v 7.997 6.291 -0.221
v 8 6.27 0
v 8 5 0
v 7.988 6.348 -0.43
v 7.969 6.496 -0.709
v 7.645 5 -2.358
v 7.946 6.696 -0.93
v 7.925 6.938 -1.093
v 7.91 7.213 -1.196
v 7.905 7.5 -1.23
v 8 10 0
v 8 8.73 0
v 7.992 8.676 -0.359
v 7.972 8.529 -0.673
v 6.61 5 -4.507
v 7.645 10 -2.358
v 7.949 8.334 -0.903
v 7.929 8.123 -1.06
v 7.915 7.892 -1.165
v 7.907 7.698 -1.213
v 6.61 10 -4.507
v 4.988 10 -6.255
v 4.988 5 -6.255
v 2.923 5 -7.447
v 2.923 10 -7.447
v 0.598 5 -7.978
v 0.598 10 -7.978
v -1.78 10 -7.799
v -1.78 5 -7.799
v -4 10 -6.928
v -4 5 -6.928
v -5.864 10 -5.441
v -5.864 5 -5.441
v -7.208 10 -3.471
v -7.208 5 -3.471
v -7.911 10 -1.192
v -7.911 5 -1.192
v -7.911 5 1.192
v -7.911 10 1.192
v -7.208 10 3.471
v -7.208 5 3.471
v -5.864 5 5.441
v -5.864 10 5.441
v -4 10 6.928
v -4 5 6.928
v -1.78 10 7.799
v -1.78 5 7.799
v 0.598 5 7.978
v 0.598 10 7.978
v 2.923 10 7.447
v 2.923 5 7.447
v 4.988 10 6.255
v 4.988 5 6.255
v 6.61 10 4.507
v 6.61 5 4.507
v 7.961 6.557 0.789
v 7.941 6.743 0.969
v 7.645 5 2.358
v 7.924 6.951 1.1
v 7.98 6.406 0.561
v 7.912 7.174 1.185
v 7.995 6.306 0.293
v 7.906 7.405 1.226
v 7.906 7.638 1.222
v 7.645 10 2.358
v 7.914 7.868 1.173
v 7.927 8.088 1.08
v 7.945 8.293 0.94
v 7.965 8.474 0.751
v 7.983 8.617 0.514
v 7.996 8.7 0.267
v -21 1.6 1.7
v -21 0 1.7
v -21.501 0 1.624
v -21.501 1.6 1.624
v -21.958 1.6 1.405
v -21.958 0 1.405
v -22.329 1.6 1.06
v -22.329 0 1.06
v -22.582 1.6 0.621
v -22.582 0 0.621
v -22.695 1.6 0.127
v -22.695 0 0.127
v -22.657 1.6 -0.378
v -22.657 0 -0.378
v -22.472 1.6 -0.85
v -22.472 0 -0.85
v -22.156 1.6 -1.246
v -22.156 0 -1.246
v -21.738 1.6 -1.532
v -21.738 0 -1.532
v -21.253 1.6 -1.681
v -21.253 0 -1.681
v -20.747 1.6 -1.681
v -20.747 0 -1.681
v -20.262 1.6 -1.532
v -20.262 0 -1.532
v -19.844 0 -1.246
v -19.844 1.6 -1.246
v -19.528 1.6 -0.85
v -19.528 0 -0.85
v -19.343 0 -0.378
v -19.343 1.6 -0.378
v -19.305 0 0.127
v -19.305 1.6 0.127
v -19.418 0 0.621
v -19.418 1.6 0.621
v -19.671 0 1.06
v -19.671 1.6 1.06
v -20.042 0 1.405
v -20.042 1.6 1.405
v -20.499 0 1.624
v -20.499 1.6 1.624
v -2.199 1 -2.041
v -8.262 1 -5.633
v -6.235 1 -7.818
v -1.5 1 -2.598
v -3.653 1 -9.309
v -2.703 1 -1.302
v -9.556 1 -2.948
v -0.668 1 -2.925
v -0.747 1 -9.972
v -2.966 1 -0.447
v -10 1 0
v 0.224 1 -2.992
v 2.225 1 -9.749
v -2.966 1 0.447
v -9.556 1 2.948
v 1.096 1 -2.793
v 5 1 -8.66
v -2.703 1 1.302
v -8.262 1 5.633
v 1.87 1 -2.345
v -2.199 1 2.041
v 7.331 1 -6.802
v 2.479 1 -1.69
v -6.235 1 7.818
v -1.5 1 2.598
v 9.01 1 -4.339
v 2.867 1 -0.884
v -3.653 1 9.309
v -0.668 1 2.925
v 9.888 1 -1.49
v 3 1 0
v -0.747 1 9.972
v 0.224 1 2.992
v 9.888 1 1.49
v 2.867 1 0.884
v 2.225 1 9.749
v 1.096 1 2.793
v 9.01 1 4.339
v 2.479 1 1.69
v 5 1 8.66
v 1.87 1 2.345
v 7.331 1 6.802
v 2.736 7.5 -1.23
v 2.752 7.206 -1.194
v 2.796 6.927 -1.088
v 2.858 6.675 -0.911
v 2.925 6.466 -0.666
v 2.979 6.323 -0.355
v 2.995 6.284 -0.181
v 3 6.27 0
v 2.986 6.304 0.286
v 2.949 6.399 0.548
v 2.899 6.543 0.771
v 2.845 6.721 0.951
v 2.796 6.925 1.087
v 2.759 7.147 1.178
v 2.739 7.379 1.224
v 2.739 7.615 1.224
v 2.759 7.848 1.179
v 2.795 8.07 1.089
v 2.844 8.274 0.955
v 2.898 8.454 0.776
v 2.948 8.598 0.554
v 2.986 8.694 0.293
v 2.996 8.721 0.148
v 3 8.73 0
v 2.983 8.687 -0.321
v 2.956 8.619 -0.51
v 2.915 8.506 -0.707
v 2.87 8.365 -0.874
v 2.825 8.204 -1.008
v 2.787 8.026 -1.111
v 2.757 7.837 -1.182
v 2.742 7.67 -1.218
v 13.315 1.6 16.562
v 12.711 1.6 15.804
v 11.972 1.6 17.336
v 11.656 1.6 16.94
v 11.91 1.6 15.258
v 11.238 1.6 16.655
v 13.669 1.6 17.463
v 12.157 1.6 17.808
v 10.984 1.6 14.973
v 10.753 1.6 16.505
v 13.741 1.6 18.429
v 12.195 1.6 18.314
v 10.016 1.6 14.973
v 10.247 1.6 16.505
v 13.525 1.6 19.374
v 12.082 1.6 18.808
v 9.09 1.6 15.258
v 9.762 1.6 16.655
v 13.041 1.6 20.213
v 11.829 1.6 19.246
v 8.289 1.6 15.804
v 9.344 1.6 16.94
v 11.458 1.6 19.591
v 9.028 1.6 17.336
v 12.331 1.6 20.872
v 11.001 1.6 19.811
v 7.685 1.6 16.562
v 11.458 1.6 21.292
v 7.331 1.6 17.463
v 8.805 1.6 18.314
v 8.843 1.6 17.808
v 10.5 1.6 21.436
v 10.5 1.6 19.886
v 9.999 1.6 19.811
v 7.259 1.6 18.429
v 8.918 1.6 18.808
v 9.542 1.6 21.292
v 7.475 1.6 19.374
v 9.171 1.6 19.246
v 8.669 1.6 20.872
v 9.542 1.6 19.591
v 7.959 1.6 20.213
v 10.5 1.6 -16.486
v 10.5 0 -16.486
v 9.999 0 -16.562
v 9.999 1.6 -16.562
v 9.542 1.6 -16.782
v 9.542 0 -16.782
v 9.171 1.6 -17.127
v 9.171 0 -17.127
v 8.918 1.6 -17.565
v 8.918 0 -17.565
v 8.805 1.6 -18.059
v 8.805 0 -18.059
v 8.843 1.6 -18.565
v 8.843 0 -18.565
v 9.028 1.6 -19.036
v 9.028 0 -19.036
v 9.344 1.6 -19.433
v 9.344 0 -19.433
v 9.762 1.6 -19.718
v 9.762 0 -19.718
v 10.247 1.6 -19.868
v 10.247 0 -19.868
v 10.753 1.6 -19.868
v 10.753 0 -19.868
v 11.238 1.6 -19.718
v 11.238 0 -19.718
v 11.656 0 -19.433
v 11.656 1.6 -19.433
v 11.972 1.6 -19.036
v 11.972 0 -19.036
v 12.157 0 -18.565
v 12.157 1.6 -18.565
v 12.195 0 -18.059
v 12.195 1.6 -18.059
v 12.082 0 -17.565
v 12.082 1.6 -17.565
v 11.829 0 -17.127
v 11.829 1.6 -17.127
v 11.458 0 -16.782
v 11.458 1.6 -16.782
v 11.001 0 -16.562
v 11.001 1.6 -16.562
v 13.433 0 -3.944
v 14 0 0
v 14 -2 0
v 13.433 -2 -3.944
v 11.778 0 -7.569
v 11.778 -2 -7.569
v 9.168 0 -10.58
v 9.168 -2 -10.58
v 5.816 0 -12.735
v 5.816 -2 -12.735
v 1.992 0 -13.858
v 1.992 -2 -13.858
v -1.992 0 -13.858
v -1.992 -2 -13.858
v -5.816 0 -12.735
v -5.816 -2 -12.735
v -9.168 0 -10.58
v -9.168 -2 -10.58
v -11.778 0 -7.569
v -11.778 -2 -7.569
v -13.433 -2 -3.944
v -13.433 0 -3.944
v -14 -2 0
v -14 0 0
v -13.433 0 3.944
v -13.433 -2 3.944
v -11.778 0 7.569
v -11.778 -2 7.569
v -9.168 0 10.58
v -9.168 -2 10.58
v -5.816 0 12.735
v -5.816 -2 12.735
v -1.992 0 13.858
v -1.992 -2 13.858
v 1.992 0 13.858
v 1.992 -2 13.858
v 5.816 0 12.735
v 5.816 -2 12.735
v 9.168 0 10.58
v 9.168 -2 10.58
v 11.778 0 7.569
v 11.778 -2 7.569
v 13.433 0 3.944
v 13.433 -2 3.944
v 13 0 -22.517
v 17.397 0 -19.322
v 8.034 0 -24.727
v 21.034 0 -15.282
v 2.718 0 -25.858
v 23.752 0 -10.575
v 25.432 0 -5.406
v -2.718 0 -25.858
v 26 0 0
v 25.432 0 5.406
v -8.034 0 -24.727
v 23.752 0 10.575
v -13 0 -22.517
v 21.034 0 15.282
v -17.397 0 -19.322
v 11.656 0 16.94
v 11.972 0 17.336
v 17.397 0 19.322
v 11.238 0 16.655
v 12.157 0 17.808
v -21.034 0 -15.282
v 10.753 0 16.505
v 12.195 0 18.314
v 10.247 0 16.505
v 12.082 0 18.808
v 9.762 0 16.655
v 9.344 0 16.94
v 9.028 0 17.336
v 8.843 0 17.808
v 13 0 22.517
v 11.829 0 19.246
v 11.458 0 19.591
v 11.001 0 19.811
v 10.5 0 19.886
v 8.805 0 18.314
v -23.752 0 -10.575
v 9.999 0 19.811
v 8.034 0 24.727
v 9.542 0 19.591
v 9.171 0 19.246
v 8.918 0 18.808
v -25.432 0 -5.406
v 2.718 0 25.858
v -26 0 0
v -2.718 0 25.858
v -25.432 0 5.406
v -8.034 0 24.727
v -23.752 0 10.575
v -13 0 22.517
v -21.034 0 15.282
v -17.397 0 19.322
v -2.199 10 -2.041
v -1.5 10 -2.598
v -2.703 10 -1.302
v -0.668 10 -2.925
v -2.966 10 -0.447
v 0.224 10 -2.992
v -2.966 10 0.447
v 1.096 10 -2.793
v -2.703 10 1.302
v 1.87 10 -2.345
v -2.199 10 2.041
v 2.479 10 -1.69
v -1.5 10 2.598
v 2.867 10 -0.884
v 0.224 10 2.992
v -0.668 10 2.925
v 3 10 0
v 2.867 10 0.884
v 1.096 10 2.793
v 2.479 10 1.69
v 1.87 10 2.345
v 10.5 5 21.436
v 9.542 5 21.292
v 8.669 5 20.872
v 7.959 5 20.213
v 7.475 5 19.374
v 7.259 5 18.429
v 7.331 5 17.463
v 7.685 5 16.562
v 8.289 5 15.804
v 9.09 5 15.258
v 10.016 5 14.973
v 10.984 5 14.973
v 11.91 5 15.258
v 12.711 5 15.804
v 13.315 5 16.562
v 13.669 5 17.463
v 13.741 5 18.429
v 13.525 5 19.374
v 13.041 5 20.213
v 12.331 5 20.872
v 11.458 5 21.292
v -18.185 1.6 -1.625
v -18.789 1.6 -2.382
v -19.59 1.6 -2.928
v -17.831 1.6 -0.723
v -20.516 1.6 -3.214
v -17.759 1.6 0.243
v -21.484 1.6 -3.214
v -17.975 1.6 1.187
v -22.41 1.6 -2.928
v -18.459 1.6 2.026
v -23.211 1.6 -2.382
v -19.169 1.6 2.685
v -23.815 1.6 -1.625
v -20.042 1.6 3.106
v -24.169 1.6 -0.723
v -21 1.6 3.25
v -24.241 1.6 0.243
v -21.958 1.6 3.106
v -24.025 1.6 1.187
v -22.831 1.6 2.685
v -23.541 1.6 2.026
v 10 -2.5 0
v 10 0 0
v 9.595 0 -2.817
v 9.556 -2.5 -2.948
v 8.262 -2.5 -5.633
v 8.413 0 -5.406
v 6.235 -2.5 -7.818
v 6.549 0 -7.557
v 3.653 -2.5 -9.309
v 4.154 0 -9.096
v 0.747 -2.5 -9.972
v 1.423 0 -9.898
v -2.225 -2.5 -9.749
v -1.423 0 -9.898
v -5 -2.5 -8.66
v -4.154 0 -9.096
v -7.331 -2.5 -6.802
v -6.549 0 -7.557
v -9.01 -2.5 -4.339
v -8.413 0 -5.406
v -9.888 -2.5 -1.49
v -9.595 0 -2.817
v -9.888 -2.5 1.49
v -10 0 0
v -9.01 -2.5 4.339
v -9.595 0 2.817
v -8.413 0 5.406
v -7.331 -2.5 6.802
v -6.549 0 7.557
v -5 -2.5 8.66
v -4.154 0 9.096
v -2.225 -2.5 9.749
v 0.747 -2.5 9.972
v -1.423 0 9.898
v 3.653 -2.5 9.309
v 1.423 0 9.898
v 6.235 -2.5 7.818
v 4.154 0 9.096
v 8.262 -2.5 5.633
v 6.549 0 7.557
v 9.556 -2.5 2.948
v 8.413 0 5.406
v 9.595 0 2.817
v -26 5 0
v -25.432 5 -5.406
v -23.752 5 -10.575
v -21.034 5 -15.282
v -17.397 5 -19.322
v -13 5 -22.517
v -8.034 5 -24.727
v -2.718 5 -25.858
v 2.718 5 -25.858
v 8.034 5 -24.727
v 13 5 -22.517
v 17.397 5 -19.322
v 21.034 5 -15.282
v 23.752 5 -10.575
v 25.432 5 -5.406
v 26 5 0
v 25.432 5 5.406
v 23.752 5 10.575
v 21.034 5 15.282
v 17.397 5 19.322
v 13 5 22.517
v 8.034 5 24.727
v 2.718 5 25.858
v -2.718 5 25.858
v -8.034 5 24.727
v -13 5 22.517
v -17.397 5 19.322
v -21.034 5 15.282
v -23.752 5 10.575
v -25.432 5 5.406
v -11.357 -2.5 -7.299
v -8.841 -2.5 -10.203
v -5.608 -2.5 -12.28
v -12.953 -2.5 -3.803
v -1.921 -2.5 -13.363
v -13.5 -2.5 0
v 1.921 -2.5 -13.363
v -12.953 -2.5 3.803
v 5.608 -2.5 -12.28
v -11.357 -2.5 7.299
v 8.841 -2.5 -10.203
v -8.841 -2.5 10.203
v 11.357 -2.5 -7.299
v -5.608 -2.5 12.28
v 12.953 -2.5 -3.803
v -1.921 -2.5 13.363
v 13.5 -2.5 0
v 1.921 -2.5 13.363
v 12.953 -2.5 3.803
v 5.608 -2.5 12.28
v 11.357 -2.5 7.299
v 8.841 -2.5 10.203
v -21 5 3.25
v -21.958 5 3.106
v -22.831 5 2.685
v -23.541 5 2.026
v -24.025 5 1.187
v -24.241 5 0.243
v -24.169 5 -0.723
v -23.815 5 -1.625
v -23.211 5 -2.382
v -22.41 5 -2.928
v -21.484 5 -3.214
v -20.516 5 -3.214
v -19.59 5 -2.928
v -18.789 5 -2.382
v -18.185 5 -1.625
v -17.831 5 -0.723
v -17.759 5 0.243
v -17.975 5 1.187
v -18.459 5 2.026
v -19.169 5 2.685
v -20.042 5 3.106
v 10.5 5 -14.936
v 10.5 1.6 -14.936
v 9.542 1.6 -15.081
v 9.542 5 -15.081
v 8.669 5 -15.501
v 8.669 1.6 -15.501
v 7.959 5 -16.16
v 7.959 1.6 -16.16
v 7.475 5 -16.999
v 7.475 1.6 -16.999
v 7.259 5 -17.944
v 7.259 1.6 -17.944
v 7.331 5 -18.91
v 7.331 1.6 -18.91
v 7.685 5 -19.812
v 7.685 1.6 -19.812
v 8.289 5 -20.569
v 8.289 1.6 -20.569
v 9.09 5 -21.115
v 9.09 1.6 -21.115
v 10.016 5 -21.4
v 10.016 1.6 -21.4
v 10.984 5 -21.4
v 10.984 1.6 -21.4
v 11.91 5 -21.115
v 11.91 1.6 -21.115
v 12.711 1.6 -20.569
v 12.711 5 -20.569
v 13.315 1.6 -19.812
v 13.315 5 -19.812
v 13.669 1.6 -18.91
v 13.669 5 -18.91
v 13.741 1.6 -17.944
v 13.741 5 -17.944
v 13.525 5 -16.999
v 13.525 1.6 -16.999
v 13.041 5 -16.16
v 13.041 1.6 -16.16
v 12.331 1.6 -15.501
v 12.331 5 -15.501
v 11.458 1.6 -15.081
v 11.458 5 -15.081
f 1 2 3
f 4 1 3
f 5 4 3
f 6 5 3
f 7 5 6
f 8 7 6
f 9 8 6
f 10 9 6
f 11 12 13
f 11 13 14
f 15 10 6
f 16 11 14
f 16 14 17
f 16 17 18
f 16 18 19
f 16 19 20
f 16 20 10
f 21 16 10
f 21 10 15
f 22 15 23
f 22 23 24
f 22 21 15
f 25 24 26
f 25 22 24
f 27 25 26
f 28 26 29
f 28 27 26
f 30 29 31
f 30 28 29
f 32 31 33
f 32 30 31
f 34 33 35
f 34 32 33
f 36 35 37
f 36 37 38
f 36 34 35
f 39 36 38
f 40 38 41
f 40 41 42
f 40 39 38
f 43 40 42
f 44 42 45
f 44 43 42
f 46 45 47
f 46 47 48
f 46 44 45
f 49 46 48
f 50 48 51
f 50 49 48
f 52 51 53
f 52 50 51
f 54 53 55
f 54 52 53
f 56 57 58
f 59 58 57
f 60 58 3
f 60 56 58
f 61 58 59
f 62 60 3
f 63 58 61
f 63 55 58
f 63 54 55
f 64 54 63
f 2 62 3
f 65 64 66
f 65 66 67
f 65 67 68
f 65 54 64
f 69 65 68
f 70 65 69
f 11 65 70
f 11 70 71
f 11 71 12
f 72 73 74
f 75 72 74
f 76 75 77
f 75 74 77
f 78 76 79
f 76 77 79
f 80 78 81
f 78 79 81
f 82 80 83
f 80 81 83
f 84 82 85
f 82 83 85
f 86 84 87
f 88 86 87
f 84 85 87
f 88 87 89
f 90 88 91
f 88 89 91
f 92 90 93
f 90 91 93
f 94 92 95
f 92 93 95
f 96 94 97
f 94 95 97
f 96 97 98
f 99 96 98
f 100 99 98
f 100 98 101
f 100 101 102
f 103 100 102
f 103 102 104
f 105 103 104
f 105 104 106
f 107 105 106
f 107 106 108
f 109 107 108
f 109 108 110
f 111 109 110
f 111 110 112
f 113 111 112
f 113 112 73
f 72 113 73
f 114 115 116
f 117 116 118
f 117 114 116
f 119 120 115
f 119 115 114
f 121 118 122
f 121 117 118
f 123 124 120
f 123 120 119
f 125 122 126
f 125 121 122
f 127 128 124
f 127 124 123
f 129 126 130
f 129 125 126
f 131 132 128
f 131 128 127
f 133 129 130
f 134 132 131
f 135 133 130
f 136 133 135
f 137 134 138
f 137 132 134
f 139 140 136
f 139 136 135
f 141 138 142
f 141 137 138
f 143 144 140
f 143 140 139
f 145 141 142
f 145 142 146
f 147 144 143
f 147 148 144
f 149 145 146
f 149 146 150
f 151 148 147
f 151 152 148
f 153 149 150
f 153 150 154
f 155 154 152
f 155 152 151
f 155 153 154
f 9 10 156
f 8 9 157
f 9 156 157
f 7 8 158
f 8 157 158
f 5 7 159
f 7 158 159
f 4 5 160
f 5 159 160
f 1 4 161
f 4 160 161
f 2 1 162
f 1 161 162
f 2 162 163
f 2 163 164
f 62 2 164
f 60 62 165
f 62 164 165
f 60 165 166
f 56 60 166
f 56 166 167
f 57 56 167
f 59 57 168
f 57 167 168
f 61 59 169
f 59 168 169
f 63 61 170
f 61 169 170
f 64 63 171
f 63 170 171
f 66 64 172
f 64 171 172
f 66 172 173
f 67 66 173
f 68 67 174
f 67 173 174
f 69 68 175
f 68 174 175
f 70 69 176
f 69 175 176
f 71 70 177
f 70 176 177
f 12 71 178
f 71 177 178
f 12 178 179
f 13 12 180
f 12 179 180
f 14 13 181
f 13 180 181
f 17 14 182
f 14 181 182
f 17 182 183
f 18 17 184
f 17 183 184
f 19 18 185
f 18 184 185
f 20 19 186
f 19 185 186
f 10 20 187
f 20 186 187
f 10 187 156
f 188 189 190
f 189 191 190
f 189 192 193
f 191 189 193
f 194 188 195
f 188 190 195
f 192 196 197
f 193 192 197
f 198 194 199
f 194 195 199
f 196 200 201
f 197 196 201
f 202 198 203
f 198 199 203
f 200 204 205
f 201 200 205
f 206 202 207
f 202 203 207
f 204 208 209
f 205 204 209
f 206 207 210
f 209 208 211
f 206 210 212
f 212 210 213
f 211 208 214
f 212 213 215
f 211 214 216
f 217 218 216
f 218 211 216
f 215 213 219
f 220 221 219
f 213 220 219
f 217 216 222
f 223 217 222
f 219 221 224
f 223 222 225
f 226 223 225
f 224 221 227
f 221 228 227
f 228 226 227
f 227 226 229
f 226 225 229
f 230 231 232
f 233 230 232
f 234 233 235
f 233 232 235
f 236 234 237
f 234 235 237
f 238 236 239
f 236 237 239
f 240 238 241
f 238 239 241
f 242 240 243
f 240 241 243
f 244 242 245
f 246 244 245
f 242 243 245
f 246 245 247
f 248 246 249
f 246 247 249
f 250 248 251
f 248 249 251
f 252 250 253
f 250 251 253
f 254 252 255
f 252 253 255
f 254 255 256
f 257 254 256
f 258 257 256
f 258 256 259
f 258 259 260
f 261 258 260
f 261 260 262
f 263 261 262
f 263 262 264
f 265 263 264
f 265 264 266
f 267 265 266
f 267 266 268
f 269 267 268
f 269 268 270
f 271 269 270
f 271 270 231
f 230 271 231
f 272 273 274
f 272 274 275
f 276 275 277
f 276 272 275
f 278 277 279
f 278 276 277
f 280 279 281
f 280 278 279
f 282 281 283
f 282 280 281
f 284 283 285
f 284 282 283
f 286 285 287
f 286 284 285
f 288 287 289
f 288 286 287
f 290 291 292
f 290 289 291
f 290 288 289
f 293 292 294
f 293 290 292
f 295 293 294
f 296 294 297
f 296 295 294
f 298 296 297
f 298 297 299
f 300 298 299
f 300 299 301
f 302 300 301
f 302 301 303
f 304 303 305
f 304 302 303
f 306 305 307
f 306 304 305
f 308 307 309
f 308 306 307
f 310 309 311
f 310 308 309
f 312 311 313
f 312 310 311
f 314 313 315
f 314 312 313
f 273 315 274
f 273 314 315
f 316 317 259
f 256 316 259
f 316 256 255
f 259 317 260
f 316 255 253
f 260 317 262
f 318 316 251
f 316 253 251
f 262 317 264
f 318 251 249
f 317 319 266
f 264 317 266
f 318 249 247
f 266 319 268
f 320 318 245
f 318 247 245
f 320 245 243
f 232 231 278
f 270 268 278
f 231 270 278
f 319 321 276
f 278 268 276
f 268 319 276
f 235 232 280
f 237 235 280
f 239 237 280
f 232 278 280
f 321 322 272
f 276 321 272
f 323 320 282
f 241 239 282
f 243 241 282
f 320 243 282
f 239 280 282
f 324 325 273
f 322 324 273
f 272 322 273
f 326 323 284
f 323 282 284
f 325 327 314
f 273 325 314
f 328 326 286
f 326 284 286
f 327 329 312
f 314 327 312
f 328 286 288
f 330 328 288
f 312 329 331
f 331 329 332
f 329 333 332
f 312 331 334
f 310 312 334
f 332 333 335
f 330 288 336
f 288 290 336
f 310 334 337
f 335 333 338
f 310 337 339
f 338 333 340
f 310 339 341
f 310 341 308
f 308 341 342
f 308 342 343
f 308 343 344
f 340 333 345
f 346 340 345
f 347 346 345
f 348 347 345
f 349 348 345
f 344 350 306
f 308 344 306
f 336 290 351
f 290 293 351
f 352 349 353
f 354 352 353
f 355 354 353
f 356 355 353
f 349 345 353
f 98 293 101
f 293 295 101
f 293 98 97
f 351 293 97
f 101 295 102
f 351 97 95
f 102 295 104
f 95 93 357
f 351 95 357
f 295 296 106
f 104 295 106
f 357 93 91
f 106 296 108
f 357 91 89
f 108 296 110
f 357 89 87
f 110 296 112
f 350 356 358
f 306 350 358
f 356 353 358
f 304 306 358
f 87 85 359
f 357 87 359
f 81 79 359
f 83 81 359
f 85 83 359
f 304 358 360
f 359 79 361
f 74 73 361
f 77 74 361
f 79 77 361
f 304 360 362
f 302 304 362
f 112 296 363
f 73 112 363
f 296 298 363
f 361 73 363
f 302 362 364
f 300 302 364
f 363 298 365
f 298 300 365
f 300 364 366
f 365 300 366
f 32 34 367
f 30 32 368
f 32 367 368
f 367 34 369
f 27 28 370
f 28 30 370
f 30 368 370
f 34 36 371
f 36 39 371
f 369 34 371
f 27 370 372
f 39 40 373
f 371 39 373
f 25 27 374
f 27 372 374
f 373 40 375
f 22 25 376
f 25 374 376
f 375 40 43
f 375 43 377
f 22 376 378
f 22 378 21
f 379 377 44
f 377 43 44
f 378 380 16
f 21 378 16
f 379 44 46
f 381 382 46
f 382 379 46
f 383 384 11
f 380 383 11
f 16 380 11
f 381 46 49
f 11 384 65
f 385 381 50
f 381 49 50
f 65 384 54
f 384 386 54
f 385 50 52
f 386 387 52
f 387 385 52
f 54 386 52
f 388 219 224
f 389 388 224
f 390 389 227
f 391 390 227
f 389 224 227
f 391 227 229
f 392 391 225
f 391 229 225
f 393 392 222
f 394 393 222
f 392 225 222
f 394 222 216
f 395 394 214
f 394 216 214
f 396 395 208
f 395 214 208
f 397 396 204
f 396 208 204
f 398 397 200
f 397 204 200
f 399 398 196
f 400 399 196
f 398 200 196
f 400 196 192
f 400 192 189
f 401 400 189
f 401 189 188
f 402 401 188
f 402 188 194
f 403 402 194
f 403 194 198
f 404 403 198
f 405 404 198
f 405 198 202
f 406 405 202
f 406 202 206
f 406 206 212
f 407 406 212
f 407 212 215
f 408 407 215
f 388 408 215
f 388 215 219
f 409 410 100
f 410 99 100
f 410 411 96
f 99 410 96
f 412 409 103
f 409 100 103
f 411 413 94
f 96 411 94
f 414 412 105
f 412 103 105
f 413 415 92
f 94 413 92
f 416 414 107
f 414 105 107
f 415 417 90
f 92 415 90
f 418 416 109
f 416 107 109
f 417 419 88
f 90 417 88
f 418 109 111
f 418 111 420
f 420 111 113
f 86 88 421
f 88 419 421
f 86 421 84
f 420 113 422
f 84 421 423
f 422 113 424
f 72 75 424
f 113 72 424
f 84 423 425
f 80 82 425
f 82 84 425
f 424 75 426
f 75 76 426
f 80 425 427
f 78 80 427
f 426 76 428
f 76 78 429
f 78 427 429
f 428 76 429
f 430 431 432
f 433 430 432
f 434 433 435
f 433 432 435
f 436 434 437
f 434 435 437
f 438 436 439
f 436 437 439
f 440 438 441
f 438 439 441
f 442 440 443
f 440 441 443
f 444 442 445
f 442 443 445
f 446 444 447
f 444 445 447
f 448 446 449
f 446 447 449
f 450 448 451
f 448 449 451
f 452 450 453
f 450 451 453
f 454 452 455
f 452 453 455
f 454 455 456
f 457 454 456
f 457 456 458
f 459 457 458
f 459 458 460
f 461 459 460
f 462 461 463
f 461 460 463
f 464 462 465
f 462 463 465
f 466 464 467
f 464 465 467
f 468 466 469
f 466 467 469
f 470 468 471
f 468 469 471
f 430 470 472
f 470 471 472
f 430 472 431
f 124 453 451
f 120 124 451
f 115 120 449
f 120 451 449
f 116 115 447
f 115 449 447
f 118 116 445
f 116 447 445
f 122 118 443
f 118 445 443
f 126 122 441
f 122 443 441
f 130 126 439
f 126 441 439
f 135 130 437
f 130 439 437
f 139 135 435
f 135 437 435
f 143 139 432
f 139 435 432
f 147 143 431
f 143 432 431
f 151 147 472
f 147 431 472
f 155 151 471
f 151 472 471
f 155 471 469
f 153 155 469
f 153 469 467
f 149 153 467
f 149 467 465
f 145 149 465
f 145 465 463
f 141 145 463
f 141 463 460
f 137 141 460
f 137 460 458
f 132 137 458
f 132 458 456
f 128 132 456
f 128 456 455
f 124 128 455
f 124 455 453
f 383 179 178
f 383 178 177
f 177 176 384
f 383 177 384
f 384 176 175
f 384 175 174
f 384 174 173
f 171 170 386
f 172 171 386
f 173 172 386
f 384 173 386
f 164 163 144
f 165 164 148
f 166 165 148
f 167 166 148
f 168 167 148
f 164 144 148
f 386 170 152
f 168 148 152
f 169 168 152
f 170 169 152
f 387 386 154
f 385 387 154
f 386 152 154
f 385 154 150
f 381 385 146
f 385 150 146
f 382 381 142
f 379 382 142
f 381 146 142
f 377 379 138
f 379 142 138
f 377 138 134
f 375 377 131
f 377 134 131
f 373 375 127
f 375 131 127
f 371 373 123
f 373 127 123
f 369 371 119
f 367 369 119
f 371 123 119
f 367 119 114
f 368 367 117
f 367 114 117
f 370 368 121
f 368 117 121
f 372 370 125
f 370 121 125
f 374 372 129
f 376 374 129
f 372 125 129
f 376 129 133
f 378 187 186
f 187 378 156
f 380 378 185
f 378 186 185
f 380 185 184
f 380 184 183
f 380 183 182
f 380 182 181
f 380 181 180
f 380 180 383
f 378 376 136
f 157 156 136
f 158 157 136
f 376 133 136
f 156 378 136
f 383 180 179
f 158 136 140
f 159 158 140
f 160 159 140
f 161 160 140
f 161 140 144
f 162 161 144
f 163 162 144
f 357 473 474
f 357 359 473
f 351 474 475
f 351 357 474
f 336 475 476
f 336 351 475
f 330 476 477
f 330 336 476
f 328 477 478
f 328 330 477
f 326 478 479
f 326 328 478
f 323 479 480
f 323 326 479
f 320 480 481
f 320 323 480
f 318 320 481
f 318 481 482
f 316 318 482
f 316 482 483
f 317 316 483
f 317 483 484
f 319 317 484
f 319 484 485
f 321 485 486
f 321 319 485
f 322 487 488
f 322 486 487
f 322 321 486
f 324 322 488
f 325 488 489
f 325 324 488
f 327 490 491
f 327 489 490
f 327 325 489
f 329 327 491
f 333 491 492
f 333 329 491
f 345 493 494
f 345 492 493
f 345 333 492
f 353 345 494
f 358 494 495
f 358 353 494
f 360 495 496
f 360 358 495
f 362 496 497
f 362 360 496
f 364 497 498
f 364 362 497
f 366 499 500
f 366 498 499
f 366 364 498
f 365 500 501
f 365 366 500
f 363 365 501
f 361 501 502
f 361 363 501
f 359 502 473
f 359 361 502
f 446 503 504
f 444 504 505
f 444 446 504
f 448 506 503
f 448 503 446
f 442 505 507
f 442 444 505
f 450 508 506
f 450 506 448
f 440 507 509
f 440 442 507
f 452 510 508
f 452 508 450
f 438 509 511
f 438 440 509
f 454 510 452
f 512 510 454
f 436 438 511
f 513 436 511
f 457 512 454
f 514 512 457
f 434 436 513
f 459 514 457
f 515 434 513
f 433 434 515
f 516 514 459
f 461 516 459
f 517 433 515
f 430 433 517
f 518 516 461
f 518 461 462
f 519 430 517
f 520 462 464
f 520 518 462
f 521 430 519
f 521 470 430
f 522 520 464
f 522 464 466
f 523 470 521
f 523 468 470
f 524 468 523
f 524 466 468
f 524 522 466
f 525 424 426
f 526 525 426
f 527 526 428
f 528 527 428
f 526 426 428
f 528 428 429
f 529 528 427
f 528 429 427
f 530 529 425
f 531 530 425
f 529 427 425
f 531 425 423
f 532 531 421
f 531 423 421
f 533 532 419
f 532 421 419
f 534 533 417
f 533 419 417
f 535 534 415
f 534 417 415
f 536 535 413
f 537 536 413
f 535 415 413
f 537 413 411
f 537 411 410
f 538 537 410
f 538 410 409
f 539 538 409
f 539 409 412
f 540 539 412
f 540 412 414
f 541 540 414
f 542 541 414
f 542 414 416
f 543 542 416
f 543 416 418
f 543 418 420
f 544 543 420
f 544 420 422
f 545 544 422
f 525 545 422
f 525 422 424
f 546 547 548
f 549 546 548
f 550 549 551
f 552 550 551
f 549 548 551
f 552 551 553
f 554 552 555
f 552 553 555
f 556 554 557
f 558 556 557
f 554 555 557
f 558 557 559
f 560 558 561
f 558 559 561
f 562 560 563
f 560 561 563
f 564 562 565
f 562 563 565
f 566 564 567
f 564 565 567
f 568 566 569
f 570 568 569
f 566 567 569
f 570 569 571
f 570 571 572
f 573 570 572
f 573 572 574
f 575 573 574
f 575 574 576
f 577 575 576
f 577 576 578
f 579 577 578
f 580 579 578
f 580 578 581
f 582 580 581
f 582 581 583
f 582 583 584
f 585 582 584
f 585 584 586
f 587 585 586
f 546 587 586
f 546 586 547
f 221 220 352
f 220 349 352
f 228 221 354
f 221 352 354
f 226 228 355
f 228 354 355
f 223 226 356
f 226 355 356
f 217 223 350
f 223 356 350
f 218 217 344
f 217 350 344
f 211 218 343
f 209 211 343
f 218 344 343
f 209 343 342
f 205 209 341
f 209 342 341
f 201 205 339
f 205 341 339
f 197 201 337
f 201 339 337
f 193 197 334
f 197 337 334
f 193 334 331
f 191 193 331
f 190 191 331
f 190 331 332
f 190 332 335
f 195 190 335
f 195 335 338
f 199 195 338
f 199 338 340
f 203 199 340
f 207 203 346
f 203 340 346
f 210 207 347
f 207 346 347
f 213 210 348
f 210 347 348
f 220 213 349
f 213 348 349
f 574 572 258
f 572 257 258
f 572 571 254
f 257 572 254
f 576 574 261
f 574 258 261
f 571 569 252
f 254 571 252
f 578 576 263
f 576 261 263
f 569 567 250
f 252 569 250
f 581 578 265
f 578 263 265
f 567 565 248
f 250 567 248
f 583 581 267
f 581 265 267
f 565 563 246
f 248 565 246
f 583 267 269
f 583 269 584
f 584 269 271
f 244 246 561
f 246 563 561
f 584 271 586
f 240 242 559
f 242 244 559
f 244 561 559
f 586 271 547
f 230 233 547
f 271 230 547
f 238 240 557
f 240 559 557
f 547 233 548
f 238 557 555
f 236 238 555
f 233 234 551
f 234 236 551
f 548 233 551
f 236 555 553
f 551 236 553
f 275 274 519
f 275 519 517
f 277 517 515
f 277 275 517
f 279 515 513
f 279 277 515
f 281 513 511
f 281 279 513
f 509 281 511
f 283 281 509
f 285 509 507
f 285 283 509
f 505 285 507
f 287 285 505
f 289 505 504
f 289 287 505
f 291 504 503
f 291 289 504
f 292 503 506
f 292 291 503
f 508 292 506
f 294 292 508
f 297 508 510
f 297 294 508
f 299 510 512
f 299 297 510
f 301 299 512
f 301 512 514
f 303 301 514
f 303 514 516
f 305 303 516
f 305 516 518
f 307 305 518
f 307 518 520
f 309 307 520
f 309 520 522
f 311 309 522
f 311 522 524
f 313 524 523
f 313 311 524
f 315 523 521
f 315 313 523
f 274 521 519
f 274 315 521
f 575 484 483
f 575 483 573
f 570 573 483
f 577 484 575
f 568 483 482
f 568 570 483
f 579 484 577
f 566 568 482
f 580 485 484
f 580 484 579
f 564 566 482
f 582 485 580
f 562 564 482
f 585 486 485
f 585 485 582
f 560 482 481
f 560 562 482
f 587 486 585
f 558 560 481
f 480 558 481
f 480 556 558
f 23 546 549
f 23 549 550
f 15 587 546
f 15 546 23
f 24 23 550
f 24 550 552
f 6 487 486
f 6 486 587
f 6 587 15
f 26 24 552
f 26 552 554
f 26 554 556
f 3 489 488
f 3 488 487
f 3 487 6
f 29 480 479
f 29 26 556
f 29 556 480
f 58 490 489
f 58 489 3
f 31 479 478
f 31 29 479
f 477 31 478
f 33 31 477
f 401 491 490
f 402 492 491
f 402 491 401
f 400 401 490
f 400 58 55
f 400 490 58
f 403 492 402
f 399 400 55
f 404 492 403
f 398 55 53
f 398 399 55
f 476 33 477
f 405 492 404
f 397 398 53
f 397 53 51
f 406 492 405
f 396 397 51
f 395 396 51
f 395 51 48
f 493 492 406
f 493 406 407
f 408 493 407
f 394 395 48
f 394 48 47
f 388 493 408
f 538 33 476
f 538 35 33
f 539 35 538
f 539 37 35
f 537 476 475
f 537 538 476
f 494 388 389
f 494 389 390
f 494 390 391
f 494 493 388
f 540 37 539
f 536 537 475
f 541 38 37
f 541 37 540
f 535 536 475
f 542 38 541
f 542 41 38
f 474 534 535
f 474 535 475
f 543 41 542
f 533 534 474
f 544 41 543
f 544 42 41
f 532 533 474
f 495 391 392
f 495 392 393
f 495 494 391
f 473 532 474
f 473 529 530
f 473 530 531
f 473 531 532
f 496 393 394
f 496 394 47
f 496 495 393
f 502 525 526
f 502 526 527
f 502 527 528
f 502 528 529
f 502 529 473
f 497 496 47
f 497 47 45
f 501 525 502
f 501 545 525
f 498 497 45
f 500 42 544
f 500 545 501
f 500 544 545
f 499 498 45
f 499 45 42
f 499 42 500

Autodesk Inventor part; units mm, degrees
ref_plane "XZ Plane" through (0, 0, 0) normal (0, 1, 0) x (-1, 0, 0)
sketch "Sketch1" plane through (0, 0, 0) normal (0, 1, 0) x (-1, 0, 0)
  circle A0 centre (0, 0) radius 10
  circle A1 centre (0, 0) radius 26
  dimension "d0" = 20
  dimension "d8" = 52
extrude "Extrusion1" add sketch "Sketch1" along normal blind 5
sketch "Sketch2" plane through (0, 0, 0) normal (0, -1, 0) x (1, 0, 0)
  circle A0 centre (0, 0) radius 14
  circle A1 centre (0, 0) radius 10 projected
  dimension "d56" = 28
extrude "Extrusion2" add sketch "Sketch2" along normal blind 2.5
sketch "Sketch3" plane through (0, 5, 0) normal (0, 1, 0) x (1, 0, 0)
  circle A0 centre (0, 0) radius 21 construction
  line L0 (36.4, 0) -> (-36.4, 0) projected
  circle A1 centre (0, 0) radius 21 construction
  circle A2 centre (0, 0) radius 21 construction
  point P0 (-21, 0)
  point P1 (10.5, -18.1865)
  point P2 (10.5, 18.1865)
  dimension "d7" = 42
  dimension "d11" = 360
hole "Hole1" at (-21, 5, 0) at (10.5, 5, 18.1865) at (10.5, 5, -18.1865) direction (0, -1, 0) diameter 3.4 end through all counterbore diameter 6.5 counterbore depth 3.4 clearance for "Socket Head Cap Screw ISO 4762" size "M3" standard "ISO"
ref_plane "Work Plane2" through (0, 1, 0) normal (0, -1, 0) x (1, 0, 0)
sketch "Sketch8" plane through (0, 1, 0) normal (0, -1, 0) x (1, 0, 0)
  circle A0 centre (0, 0) radius 10 projected
  circle A1 centre (0, 0) radius 10 projected
  circle A2 centre (0, 0) radius 3
  dimension "d39" = 6
extrude "Extrusion5" add sketch "Sketch8" against normal blind 9
ref_plane "Work Plane3" through (8, 0, 0) normal (1, 0, 0) x (0, 1, 0)
sketch "Sketch9" plane through (0, 10, 0) normal (0, 1, 0) x (1, 0, 0)
  circle A0 centre (0, 0) radius 8
  circle A1 centre (0, 0) radius 3 projected
  circle A2 centre (0, 0) radius 10 projected
  circle A3 centre (0, 0) radius 3 projected
  dimension "d43" = 5
extrude "Extrusion6" cut sketch "Sketch9" against normal blind 5 contours A2
sketch "Sketch10" plane through (8, 0, 0) normal (1, 0, 0) x (0, 1, 0)
  line L0 (5, -8) -> (5, 8) projected
  line L1 (10, -8) -> (10, 8) projected
  line L2 (10, 0) -> (5, 0) construction
  point P0 (0, 0)
  point P1 (7.5, 0)
hole "Hole3" at (8, 7.5, 0) direction (-1, 0, 0) diameter 2.459 depth 8.8 tip angle 118 thread size "M3x0.5" class "6H" standard "ISO Metric profile"
chamfer "Chamfer1" distance 0.5 angle 45 1 edges at (-14, -2.5, 0)
properties part number "rotation stopper"
